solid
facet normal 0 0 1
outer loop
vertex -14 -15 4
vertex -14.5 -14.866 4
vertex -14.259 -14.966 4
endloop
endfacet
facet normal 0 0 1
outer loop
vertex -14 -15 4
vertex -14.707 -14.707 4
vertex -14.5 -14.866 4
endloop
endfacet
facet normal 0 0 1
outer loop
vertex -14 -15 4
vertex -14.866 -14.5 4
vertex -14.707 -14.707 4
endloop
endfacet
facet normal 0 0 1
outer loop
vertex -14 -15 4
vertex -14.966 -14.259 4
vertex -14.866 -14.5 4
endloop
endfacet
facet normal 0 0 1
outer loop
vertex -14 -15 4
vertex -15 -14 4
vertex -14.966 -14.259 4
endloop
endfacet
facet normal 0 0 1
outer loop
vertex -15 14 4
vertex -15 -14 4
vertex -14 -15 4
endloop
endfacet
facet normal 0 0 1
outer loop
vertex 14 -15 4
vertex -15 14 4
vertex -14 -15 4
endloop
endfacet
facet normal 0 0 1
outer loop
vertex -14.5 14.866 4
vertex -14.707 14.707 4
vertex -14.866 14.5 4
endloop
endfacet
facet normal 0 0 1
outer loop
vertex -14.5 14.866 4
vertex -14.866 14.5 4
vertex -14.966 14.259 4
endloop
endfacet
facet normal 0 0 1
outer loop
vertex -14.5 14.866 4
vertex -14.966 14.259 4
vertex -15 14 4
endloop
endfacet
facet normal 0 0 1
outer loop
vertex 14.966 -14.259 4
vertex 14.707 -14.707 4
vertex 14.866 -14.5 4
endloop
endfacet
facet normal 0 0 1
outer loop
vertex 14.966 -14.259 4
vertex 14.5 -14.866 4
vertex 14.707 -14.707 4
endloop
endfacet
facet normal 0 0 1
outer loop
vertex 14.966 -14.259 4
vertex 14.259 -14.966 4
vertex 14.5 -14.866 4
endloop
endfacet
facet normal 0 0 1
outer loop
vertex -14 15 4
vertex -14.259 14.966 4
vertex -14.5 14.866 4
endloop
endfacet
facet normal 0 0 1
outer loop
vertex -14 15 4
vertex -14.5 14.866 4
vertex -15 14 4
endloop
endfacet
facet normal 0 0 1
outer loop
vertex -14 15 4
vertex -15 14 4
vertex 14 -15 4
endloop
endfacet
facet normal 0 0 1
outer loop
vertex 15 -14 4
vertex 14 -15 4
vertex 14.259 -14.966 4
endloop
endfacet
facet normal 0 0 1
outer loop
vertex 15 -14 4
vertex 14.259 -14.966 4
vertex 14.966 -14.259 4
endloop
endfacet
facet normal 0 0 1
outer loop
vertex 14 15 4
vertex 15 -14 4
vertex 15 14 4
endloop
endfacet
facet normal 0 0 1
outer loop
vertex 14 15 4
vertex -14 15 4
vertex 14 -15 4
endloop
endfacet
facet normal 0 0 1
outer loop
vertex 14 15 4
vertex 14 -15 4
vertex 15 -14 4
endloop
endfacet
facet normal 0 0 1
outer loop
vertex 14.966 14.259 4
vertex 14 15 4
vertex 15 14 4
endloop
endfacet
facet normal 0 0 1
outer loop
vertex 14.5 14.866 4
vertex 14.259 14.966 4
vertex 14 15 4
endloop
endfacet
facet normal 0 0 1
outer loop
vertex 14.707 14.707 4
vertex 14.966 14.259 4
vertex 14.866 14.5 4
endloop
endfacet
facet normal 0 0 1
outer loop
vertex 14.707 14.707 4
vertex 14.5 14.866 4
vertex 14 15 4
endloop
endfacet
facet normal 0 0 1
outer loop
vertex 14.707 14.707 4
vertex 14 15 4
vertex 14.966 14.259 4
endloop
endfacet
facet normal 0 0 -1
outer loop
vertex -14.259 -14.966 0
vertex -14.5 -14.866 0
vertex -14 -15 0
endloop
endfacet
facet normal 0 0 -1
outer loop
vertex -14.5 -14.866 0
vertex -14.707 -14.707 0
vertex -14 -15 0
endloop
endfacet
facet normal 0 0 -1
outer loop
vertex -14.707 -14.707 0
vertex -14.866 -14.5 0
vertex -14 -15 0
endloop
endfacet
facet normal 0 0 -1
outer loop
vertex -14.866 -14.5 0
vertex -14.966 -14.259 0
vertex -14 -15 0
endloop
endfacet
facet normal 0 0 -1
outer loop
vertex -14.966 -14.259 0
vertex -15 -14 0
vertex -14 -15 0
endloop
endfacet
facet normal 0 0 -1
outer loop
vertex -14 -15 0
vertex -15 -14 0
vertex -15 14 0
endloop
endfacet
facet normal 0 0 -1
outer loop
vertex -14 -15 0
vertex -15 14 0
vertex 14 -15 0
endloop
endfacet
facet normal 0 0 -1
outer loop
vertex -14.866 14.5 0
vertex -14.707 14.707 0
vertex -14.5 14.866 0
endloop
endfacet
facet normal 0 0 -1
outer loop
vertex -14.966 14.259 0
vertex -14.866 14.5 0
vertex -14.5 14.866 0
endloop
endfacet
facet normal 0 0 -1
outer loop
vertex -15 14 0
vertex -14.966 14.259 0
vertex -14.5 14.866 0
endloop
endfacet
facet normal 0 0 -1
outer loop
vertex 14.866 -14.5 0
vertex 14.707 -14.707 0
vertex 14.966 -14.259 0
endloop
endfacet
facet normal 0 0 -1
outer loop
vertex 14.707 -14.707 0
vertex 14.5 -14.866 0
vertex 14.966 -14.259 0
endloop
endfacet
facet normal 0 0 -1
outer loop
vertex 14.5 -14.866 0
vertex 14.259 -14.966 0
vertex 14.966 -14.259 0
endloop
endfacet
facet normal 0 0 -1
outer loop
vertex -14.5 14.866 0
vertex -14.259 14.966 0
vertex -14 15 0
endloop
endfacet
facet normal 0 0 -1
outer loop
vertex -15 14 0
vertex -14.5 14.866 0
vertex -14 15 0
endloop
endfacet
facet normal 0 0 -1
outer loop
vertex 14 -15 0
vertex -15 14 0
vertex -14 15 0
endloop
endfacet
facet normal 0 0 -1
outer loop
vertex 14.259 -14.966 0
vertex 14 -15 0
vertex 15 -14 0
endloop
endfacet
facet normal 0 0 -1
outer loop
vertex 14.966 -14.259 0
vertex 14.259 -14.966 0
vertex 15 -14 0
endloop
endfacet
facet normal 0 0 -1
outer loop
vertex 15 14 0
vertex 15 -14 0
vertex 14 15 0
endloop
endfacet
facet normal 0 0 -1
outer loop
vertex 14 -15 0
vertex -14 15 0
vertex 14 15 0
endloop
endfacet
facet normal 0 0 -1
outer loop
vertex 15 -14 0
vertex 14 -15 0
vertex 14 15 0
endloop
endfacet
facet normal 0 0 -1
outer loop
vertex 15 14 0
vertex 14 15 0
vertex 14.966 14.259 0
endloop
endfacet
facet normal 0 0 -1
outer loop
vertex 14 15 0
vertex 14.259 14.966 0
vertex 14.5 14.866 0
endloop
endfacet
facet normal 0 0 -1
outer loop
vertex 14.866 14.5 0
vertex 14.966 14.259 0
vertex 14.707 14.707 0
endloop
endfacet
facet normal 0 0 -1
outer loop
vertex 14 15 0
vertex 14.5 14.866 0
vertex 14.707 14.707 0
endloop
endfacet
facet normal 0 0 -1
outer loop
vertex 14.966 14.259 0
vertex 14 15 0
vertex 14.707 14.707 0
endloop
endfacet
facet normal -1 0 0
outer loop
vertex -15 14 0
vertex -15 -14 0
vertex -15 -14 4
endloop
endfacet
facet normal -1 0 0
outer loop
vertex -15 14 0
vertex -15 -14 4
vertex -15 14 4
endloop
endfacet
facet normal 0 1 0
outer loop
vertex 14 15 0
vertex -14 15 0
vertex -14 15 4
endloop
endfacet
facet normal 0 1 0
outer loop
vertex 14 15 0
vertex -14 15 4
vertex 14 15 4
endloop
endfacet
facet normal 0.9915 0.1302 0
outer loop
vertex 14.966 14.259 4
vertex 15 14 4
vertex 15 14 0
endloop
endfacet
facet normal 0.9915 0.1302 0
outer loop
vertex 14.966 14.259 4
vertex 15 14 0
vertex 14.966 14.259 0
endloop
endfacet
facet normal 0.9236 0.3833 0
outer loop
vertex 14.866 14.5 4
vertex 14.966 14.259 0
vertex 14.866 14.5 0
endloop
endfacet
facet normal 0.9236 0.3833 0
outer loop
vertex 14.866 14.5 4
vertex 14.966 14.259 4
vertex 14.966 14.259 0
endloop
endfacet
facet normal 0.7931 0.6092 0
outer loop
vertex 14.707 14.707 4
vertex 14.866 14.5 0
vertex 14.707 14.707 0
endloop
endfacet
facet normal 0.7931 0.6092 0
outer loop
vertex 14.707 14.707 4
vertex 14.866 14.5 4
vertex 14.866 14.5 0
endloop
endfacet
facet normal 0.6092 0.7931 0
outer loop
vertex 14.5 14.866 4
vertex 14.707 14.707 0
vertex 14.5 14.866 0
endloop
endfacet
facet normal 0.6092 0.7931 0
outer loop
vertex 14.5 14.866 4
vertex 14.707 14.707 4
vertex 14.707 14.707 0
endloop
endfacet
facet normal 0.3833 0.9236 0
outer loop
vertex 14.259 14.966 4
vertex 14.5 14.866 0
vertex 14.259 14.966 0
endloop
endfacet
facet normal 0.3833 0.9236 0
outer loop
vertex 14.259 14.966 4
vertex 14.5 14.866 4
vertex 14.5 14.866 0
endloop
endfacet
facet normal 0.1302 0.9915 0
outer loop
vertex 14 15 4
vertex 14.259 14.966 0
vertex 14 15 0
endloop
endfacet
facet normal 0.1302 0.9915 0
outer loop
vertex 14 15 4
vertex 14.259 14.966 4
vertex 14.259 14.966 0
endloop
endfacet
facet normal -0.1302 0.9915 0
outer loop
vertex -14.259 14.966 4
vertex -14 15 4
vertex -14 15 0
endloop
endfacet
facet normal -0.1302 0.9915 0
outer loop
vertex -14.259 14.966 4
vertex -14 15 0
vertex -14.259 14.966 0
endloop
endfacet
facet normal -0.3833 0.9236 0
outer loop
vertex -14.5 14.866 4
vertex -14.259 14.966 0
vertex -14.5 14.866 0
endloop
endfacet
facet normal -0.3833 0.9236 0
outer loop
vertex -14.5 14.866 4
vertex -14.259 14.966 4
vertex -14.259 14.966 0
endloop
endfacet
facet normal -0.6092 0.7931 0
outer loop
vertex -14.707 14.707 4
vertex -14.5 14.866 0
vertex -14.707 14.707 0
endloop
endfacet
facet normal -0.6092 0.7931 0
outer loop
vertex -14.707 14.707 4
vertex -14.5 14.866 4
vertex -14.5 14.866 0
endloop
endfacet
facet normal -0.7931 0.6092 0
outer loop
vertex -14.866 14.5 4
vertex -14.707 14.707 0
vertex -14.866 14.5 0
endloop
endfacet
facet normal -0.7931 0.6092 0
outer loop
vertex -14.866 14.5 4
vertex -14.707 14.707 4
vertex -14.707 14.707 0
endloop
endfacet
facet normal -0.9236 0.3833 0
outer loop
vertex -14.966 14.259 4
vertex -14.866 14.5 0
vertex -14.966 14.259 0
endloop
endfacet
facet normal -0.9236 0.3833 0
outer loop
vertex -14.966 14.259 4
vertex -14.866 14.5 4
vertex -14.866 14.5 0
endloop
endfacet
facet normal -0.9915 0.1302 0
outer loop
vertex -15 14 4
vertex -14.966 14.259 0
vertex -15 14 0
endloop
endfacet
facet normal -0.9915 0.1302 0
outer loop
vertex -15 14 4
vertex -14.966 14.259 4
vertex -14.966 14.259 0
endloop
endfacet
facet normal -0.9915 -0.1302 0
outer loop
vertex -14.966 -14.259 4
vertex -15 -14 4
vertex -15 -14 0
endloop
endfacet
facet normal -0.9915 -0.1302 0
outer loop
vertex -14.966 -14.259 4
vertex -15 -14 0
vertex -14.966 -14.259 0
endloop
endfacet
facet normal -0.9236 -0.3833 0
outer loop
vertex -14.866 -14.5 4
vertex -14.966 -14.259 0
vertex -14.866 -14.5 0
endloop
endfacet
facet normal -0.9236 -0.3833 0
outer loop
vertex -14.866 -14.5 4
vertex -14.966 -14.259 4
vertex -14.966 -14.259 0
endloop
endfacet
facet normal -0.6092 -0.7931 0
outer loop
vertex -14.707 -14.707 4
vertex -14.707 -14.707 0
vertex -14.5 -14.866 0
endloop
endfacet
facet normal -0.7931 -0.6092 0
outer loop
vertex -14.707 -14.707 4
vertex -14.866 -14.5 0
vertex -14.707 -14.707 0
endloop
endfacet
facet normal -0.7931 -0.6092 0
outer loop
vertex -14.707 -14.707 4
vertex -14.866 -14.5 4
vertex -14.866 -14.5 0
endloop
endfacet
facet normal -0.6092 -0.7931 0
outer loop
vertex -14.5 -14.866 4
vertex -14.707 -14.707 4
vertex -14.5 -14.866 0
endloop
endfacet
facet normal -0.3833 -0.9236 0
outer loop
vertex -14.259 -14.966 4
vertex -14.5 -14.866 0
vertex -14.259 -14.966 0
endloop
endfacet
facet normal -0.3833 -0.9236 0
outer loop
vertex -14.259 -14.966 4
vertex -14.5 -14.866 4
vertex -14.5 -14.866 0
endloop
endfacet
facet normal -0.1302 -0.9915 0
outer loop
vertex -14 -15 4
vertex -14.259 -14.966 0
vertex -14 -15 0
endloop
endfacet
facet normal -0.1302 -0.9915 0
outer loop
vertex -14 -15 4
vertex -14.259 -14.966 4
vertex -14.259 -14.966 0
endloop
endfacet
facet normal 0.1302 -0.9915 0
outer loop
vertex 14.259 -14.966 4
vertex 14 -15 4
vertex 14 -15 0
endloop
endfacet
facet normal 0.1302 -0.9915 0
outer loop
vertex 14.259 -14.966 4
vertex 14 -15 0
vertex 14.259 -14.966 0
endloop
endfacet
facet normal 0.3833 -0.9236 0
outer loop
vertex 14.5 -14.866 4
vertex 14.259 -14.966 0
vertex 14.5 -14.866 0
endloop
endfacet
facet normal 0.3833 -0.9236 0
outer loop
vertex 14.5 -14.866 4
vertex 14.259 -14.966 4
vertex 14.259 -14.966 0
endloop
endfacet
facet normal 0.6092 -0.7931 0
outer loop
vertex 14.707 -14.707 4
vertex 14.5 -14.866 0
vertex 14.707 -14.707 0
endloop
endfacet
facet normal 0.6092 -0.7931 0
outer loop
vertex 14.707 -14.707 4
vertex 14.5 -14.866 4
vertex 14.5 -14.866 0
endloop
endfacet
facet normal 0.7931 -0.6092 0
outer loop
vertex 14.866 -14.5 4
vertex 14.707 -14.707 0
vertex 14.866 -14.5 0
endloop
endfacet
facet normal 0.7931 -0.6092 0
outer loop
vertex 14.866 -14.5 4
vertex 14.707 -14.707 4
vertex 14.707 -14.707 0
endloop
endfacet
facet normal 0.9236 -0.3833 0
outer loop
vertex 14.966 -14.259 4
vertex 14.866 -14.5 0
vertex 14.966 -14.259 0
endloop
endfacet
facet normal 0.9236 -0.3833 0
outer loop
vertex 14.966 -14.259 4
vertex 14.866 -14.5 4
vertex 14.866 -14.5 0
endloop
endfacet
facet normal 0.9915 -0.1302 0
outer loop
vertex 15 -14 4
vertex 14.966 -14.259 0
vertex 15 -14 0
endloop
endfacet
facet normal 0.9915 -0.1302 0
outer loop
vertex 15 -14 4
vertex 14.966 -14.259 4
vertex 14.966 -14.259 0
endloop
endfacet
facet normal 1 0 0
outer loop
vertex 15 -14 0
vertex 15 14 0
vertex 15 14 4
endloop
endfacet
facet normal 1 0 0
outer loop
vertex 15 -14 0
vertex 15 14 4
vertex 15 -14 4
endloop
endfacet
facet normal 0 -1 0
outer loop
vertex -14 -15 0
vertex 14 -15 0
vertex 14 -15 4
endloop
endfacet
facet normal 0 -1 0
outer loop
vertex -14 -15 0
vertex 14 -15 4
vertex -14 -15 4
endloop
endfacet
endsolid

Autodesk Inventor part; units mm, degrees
ref_plane "YZ Plane" through (0, 0, 0) normal (1, 0, 0) x (0, 1, 0)
ref_plane "XZ Plane" through (0, 0, 0) normal (0, 1, 0) x (-1, 0, 0)
ref_plane "XY Plane" through (0, 0, 0) normal (0, 0, 1) x (1, 0, 0)
sketch "Sketch1" plane through (0, 0, 0) normal (0, 0, 1) x (1, 0, 0)
  line L0 (0, 20.1746) -> (0, -21.4461) construction
  line L1 (-20.2028, 0) -> (20.1685, 0) construction
  line L2 (-15, 15) -> (15, 15)
  line L3 (15, 15) -> (15, -14.9999)
  line L4 (15, -14.9999) -> (-15, -15)
  line L5 (-15, -15) -> (-15, 15)
  point P0 (0, 0)
  dimension "d0" = 29.9999
  dimension "d1" = 15
  dimension "d2" = 29.9999
  dimension "d3" = 15
extrude "Extrusion1" add sketch "Sketch1" along normal blind 4
fillet "Fillet1" radius 1 4 edges at (15, 15, 2) (-15, 15, 2) (15, -14.9999, 2) (-15, -15, 2)
chamfer "Chamfer1" [suppressed]
equation "\"d0\" = height"
equation "\"d1\" = 0.5 * height"
equation "\"d2\" = width"
equation "\"d3\" = 0.5 * width"
equation "\"d4\" = thickness"
equation "\"d6\" = fillet"
equation "\"fillet\" = 1"
equation "\"chamfer\" = 0"
equation "\"thickness\" = 4"
equation "\"width\" = 29.9999"
equation "\"height\" = 29.9999"
properties part number "Plate Filleted Corners (mm) 29.9999 x 29.9999 x 4" material "Steel, Mild"
